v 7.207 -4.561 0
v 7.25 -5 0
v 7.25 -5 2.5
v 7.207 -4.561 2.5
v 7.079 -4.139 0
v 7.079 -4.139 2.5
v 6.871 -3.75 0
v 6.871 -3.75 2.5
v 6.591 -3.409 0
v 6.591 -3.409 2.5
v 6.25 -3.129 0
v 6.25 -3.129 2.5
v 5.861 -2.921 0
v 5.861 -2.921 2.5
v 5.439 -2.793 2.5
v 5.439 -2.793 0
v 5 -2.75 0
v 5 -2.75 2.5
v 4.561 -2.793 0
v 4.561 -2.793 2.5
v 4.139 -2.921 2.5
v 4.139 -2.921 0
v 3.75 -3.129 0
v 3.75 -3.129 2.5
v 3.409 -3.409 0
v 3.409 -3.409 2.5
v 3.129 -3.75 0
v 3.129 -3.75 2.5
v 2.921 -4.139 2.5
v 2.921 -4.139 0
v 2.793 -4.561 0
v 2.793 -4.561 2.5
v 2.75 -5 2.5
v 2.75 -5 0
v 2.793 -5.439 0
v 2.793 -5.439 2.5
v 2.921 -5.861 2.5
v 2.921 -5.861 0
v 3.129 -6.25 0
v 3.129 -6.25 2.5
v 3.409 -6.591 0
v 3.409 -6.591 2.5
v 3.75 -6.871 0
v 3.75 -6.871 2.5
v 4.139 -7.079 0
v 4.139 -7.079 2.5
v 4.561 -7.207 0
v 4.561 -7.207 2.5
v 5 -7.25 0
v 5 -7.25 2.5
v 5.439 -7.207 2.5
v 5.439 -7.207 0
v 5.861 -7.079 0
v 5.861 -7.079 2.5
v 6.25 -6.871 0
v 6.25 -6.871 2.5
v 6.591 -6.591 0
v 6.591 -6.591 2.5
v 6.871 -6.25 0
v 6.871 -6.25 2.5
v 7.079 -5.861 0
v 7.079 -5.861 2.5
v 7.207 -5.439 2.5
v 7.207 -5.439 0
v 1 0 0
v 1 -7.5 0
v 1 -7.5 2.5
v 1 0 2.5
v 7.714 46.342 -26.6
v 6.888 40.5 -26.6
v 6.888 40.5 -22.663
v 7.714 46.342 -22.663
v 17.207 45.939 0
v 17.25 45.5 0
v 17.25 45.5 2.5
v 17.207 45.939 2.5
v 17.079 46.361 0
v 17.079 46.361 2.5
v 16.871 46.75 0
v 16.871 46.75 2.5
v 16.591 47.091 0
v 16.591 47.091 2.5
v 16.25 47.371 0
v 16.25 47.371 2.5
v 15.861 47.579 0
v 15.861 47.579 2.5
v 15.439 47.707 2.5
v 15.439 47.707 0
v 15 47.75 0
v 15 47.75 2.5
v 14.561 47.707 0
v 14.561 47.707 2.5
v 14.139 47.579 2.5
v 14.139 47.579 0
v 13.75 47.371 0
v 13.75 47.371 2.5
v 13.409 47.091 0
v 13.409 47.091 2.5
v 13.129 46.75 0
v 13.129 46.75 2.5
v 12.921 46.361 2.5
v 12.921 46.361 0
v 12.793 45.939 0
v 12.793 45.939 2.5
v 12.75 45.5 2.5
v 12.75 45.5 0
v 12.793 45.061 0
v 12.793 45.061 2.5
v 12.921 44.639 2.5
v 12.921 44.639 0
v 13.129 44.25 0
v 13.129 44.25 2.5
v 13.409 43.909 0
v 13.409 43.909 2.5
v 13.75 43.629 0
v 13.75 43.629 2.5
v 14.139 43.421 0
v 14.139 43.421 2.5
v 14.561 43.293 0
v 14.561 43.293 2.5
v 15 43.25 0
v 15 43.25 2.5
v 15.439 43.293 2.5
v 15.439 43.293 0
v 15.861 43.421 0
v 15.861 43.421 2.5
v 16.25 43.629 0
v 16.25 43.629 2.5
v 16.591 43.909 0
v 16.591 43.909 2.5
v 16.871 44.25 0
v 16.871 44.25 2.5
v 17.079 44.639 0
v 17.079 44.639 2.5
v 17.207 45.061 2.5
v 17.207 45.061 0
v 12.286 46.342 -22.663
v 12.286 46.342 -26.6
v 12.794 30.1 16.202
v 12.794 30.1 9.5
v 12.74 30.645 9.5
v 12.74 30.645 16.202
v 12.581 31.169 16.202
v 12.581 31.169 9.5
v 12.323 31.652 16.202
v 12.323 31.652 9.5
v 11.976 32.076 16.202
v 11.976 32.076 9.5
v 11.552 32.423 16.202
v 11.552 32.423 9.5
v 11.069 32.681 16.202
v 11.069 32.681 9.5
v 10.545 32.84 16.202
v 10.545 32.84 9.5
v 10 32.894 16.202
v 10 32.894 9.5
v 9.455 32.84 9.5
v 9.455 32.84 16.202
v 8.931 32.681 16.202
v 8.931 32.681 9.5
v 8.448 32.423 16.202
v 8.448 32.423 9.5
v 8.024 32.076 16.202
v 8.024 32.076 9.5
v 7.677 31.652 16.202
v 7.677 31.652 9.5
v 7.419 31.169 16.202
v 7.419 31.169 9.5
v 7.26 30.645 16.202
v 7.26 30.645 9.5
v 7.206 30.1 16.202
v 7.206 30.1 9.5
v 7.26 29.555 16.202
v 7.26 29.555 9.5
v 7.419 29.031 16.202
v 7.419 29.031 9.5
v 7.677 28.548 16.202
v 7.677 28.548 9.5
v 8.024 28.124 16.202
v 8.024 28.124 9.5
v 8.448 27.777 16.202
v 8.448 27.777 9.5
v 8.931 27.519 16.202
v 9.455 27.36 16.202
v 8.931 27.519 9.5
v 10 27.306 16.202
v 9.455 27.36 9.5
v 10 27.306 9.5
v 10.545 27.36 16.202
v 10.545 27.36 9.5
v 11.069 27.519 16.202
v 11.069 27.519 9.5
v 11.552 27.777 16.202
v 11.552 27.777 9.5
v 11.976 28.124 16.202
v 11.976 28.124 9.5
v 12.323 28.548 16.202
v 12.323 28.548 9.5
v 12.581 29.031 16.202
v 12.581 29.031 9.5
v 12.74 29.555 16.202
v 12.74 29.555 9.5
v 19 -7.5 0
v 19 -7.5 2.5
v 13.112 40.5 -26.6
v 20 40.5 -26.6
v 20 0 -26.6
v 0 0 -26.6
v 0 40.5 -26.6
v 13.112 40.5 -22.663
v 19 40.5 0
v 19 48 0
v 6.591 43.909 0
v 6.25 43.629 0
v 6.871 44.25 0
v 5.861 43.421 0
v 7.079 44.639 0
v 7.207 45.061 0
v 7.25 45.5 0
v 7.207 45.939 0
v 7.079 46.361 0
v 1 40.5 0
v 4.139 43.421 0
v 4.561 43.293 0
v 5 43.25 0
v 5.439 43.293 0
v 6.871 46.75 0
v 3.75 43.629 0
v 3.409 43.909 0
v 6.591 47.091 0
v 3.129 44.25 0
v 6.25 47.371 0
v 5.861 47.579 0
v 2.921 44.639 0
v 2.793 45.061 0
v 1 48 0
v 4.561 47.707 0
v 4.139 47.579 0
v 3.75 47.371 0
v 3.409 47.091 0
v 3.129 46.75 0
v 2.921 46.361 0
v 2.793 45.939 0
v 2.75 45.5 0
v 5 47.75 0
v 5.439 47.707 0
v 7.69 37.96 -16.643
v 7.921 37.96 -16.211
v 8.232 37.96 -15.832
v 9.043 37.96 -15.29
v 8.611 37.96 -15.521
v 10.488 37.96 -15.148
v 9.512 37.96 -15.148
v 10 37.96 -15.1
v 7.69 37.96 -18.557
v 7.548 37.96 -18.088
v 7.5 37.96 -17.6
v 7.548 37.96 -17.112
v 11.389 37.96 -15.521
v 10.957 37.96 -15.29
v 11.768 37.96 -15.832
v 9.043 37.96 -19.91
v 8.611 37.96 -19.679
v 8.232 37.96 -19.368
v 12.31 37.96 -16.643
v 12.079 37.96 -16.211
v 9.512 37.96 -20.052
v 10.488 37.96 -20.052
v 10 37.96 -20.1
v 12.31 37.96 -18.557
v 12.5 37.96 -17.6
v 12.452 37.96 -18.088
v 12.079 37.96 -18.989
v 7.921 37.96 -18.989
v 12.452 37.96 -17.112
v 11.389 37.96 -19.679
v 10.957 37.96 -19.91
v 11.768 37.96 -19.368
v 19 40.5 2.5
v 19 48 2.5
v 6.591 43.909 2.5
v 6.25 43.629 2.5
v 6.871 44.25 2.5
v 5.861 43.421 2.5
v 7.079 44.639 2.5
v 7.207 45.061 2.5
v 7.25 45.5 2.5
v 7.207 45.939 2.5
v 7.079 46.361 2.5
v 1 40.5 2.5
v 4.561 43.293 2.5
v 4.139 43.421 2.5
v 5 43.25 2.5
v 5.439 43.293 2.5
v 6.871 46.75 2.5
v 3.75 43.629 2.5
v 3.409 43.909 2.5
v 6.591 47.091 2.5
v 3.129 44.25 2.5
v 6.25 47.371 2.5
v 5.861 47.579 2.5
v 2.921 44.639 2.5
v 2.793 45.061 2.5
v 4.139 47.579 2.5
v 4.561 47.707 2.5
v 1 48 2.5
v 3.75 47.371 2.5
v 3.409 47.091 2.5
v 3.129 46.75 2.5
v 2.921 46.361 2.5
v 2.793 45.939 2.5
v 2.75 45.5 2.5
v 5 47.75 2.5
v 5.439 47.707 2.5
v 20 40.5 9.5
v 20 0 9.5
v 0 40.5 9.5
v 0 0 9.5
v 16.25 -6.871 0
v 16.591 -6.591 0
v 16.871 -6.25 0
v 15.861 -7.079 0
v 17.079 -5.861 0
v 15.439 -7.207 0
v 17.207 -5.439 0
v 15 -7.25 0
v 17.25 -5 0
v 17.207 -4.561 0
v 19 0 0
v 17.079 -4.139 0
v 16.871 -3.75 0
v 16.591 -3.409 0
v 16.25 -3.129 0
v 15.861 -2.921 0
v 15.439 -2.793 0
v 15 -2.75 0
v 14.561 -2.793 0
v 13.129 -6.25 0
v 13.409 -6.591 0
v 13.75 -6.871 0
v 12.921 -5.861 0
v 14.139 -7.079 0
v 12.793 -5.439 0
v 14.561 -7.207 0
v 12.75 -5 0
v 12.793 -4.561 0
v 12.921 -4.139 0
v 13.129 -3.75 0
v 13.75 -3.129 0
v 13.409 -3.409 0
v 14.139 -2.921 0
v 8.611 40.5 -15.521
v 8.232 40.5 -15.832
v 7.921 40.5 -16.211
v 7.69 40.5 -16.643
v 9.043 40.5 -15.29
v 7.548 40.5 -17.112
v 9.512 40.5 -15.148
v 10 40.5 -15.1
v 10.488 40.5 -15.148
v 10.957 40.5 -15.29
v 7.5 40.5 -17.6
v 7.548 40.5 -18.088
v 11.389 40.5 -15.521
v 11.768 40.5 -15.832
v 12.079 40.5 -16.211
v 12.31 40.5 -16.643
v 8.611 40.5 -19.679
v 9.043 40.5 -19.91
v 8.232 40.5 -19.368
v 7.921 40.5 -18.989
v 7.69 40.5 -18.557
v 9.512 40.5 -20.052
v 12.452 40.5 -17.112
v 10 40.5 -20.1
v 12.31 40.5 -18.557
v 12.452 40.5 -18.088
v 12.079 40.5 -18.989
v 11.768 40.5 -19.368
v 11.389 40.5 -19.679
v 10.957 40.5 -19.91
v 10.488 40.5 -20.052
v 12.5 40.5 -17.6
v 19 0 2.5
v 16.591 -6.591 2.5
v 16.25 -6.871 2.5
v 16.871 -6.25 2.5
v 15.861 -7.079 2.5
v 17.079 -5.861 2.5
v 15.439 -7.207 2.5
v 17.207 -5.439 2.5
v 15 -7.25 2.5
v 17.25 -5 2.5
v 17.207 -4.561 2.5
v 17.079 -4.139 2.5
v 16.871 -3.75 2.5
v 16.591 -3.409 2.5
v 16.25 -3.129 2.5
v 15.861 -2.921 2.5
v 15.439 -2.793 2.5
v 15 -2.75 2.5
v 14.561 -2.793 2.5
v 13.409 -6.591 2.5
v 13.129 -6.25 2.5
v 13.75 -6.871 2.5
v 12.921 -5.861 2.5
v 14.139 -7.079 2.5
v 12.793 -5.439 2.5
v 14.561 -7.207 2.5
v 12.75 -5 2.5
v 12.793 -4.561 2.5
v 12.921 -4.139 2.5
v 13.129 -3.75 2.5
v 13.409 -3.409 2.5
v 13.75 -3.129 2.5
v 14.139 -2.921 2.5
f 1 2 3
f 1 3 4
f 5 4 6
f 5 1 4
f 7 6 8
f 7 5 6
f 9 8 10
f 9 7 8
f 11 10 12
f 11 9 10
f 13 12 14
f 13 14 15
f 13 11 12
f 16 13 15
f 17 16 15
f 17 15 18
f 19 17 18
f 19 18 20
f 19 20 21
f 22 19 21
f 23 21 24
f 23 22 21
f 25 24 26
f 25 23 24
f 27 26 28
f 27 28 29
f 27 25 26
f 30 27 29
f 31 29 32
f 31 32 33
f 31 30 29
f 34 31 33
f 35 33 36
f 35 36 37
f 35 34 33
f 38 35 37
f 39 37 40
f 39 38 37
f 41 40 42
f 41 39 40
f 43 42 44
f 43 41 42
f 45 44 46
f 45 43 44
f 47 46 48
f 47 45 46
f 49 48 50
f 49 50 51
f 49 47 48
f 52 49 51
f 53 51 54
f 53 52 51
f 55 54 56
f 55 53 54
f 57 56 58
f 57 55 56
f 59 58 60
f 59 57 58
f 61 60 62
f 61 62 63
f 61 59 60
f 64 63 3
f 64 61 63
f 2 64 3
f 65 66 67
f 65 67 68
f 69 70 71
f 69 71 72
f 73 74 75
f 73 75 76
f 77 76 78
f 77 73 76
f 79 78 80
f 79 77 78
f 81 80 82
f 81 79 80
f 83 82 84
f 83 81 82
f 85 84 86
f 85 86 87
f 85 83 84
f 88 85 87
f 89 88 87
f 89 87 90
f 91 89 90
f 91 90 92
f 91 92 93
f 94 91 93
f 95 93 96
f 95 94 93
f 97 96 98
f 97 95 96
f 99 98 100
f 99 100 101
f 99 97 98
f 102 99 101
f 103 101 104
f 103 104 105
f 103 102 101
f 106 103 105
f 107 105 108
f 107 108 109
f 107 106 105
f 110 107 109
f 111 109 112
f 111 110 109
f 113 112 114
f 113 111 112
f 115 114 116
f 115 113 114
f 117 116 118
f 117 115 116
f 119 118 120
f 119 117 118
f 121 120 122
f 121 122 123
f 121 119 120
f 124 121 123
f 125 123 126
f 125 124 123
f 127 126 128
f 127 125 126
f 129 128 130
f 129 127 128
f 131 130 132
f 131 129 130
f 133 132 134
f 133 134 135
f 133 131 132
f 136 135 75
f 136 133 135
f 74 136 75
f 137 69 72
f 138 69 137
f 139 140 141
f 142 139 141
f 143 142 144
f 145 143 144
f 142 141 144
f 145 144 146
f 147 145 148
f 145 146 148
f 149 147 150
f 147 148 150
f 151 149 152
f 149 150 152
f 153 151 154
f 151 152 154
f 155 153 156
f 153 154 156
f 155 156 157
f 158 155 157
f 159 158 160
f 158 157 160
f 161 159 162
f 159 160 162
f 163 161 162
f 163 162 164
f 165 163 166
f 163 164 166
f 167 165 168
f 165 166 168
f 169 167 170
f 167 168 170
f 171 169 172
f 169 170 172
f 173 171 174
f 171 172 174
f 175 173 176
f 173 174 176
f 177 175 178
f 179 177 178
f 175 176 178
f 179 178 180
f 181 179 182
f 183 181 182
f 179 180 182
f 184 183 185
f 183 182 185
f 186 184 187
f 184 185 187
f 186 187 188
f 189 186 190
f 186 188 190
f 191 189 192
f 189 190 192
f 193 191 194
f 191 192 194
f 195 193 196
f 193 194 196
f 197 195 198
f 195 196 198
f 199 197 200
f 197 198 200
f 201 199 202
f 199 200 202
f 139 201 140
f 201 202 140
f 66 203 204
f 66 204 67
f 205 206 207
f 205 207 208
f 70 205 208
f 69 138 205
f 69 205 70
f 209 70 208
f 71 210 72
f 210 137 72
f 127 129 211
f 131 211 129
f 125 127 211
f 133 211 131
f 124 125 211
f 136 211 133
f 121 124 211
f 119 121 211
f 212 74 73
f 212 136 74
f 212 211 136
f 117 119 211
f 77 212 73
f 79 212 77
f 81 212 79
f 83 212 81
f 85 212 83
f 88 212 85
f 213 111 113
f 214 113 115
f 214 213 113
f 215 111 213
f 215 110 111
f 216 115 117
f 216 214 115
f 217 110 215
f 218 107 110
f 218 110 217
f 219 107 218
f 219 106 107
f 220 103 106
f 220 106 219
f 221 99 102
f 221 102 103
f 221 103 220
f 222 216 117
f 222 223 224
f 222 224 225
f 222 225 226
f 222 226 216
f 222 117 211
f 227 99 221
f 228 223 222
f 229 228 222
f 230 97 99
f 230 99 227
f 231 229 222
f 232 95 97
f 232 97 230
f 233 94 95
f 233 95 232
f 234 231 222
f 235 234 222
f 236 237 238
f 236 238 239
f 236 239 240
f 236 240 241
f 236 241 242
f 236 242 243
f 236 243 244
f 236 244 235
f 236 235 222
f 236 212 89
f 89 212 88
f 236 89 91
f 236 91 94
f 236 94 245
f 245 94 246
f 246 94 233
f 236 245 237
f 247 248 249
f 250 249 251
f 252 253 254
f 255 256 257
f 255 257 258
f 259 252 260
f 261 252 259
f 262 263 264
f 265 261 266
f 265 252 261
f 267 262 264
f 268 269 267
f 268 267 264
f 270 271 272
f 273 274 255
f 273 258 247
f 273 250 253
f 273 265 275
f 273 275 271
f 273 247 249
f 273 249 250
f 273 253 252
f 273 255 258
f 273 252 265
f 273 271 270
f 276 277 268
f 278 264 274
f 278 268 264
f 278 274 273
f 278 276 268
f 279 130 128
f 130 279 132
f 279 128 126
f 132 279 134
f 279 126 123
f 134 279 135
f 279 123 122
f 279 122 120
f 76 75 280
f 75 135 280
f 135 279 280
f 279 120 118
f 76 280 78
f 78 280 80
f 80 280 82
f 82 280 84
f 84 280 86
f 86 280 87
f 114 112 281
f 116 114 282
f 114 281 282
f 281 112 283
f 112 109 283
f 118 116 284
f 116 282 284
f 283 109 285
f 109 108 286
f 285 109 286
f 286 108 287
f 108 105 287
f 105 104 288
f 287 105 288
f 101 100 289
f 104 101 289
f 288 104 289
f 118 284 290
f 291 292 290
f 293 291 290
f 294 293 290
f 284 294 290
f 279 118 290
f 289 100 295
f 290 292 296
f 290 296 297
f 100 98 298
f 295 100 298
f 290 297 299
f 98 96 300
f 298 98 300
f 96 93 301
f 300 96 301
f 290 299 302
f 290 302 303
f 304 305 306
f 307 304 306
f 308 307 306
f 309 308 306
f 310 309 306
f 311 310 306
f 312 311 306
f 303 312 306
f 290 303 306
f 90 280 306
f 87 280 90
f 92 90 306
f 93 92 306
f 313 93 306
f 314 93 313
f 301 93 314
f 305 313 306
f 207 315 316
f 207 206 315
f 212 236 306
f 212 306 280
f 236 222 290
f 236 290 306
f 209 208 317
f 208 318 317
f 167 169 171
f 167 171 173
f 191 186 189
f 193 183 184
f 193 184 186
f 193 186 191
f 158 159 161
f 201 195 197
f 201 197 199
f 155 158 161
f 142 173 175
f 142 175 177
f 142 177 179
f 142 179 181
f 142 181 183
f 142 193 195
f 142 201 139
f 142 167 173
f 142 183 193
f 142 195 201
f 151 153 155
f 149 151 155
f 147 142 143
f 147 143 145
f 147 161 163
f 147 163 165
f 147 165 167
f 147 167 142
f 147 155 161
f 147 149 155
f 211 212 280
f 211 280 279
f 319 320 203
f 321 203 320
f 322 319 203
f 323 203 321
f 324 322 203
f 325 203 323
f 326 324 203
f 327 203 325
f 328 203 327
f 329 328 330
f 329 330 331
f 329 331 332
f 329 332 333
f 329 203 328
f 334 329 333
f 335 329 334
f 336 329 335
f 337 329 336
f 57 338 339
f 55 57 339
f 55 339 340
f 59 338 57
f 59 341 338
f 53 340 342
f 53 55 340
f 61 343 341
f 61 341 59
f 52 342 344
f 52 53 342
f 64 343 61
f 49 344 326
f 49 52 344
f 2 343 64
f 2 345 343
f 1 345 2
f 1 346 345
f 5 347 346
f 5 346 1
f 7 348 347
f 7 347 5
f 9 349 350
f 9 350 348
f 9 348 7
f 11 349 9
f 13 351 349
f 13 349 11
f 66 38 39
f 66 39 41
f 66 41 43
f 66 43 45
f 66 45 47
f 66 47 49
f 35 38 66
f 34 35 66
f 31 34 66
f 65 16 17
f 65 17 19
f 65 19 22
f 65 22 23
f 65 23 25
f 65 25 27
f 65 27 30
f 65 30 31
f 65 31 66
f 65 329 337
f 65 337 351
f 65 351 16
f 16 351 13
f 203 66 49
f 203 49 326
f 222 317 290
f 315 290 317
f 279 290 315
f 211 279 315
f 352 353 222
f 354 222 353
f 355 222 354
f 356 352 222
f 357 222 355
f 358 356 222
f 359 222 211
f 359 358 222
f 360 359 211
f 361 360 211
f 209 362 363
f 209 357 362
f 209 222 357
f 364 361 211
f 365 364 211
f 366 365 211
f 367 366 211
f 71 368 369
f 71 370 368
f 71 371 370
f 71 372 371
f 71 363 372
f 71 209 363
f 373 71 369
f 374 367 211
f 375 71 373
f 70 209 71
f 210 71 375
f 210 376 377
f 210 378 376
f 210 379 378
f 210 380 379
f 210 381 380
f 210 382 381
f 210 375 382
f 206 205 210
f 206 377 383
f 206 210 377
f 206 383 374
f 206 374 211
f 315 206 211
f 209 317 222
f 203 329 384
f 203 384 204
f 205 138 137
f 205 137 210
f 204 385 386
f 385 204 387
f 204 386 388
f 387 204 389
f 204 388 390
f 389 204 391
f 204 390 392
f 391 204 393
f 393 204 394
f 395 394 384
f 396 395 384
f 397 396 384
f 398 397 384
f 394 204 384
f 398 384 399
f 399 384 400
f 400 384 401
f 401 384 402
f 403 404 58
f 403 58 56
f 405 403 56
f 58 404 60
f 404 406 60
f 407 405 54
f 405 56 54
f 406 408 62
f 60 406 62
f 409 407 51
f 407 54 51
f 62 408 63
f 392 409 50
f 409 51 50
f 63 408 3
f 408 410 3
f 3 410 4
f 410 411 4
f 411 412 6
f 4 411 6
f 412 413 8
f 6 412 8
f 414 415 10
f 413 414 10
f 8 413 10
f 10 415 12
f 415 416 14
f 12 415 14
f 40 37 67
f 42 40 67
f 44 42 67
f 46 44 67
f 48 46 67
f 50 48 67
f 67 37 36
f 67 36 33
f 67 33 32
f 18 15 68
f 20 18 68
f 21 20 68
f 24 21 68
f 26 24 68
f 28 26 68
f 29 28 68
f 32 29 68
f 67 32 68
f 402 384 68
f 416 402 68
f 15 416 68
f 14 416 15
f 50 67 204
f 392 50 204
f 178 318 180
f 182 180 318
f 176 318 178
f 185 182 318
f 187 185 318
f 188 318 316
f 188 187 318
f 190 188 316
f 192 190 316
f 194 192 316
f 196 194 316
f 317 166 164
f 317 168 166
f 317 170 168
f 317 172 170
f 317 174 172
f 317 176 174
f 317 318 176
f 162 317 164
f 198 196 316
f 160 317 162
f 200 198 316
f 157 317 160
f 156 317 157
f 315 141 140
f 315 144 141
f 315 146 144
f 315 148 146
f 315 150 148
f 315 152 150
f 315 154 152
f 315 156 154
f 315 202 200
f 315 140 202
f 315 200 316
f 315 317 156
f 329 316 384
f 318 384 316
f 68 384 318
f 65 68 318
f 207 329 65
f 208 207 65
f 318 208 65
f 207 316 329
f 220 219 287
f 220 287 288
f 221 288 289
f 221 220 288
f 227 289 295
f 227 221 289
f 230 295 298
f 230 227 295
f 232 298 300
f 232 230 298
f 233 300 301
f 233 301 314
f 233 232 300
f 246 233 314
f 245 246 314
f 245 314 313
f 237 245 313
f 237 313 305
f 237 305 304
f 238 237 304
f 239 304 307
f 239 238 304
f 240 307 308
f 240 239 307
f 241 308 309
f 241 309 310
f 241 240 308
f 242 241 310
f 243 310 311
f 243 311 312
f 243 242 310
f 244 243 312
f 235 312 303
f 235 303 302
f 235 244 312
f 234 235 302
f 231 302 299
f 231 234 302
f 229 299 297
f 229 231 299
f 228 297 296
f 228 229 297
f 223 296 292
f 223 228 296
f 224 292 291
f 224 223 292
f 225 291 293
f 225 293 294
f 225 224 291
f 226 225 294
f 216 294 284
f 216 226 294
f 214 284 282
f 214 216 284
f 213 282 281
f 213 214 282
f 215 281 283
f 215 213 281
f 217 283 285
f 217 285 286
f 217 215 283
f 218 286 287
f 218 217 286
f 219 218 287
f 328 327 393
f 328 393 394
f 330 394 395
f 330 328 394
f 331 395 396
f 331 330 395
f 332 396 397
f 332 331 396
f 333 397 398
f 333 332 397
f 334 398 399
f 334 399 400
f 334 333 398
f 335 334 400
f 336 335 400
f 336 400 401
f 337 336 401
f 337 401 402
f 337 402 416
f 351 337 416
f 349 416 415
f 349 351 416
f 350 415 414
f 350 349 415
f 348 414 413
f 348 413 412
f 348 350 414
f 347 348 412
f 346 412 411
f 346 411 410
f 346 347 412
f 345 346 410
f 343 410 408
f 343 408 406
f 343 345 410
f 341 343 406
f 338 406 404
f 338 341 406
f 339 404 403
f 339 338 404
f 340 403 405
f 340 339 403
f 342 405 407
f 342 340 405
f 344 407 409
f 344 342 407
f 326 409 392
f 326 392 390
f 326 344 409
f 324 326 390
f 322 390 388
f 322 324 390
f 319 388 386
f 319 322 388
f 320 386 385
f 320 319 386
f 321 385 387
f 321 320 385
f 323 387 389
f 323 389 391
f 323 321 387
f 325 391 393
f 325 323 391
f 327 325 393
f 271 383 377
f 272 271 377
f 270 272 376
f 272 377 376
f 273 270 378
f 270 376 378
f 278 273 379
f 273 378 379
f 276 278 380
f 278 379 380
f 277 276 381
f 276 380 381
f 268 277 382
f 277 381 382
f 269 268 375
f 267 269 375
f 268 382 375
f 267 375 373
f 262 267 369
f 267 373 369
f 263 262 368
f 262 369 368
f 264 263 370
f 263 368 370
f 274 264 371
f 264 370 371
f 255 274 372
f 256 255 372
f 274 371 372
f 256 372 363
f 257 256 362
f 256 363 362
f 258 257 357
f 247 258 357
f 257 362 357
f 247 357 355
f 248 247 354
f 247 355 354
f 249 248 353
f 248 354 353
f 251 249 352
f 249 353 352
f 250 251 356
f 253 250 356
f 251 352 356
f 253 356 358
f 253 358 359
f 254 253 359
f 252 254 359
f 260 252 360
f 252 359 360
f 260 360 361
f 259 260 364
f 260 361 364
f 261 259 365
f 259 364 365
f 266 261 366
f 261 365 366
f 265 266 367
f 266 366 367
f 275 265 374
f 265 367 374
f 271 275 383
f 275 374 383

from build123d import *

# Parameters (mm, degrees)
SKETCH1_W           = 20
SKETCH1_H           = 40.5
BOSS_EXTRUDE1_DEPTH = 9.50000005
SKETCH2_W           = 20
SKETCH2_H           = 40.5
BOSS_EXTRUDE2_DEPTH = 17.1
SKETCH3_R           = 2.25
BOSS_EXTRUDE3_DEPTH = 2.5
SKETCH4_R           = 2.794
BOSS_EXTRUDE4_DEPTH = 6.702060002
SKETCH7_R           = 2.5
CUT_EXTRUDE1_DEPTH  = 2.54
BOSS_EXTRUDE6_DEPTH = 3.937


with BuildPart() as part:
    # Sketch1 → Boss-Extrude1 (new body, symmetric)
    with BuildSketch(Plane.XY):
        with Locations((10, 20.25)):
            Rectangle(SKETCH1_W, SKETCH1_H)
    extrude(amount=BOSS_EXTRUDE1_DEPTH, both=True)

    # Sketch2 → Boss-Extrude2 (add)
    with BuildSketch(Plane(origin=(0, 0, -9.50000005), x_dir=(-1, 0, 0), z_dir=(0, 0, -1))):
        with Locations((-10, 20.25)):
            Rectangle(SKETCH2_W, SKETCH2_H)
    extrude(amount=BOSS_EXTRUDE2_DEPTH)

    # Sketch3 → Boss-Extrude3 (add)
    with BuildSketch(Plane.XY):
        Polygon((19, 0), (19, -7.5), (1, -7.5), (1, 0), (0, 0), (0, 40.5), (1, 40.5), (1, 48), (19, 48), (19, 40.5), (20, 40.5), (20, 0), align=None)
        with Locations((5, -5)):
            Circle(SKETCH3_R, mode=Mode.SUBTRACT)
        with Locations((15, -5)):
            Circle(SKETCH3_R, mode=Mode.SUBTRACT)
        with Locations((5, 45.5)):
            Circle(SKETCH3_R, mode=Mode.SUBTRACT)
        with Locations((15, 45.5)):
            Circle(SKETCH3_R, mode=Mode.SUBTRACT)
    extrude(amount=BOSS_EXTRUDE3_DEPTH)

    # Sketch4 → Boss-Extrude4 (add)
    with BuildSketch(Plane.XY.offset(9.50000005)):
        with Locations((10, 30.1)):
            Circle(SKETCH4_R)
    extrude(amount=BOSS_EXTRUDE4_DEPTH)

    # Sketch7 → Cut-Extrude1 (cut)
    with BuildSketch(Plane(origin=(0, 40.5, 0), x_dir=(1, 0, 0), z_dir=(0, 1, 0))):
        with Locations((10, 17.60000005)):
            Circle(SKETCH7_R)
    extrude(amount=-CUT_EXTRUDE1_DEPTH, mode=Mode.SUBTRACT)

    # Sketch9 → Boss-Extrude6 (add)
    with BuildSketch(Plane(origin=(0, 0, -26.60000005), x_dir=(-1, 0, 0), z_dir=(0, 0, -1))):
        Polygon((-13.1115, 40.5), (-6.8885, 40.5), (-7.714, 46.342), (-12.286, 46.342), align=None)
    extrude(amount=-BOSS_EXTRUDE6_DEPTH)


solid = part.part
